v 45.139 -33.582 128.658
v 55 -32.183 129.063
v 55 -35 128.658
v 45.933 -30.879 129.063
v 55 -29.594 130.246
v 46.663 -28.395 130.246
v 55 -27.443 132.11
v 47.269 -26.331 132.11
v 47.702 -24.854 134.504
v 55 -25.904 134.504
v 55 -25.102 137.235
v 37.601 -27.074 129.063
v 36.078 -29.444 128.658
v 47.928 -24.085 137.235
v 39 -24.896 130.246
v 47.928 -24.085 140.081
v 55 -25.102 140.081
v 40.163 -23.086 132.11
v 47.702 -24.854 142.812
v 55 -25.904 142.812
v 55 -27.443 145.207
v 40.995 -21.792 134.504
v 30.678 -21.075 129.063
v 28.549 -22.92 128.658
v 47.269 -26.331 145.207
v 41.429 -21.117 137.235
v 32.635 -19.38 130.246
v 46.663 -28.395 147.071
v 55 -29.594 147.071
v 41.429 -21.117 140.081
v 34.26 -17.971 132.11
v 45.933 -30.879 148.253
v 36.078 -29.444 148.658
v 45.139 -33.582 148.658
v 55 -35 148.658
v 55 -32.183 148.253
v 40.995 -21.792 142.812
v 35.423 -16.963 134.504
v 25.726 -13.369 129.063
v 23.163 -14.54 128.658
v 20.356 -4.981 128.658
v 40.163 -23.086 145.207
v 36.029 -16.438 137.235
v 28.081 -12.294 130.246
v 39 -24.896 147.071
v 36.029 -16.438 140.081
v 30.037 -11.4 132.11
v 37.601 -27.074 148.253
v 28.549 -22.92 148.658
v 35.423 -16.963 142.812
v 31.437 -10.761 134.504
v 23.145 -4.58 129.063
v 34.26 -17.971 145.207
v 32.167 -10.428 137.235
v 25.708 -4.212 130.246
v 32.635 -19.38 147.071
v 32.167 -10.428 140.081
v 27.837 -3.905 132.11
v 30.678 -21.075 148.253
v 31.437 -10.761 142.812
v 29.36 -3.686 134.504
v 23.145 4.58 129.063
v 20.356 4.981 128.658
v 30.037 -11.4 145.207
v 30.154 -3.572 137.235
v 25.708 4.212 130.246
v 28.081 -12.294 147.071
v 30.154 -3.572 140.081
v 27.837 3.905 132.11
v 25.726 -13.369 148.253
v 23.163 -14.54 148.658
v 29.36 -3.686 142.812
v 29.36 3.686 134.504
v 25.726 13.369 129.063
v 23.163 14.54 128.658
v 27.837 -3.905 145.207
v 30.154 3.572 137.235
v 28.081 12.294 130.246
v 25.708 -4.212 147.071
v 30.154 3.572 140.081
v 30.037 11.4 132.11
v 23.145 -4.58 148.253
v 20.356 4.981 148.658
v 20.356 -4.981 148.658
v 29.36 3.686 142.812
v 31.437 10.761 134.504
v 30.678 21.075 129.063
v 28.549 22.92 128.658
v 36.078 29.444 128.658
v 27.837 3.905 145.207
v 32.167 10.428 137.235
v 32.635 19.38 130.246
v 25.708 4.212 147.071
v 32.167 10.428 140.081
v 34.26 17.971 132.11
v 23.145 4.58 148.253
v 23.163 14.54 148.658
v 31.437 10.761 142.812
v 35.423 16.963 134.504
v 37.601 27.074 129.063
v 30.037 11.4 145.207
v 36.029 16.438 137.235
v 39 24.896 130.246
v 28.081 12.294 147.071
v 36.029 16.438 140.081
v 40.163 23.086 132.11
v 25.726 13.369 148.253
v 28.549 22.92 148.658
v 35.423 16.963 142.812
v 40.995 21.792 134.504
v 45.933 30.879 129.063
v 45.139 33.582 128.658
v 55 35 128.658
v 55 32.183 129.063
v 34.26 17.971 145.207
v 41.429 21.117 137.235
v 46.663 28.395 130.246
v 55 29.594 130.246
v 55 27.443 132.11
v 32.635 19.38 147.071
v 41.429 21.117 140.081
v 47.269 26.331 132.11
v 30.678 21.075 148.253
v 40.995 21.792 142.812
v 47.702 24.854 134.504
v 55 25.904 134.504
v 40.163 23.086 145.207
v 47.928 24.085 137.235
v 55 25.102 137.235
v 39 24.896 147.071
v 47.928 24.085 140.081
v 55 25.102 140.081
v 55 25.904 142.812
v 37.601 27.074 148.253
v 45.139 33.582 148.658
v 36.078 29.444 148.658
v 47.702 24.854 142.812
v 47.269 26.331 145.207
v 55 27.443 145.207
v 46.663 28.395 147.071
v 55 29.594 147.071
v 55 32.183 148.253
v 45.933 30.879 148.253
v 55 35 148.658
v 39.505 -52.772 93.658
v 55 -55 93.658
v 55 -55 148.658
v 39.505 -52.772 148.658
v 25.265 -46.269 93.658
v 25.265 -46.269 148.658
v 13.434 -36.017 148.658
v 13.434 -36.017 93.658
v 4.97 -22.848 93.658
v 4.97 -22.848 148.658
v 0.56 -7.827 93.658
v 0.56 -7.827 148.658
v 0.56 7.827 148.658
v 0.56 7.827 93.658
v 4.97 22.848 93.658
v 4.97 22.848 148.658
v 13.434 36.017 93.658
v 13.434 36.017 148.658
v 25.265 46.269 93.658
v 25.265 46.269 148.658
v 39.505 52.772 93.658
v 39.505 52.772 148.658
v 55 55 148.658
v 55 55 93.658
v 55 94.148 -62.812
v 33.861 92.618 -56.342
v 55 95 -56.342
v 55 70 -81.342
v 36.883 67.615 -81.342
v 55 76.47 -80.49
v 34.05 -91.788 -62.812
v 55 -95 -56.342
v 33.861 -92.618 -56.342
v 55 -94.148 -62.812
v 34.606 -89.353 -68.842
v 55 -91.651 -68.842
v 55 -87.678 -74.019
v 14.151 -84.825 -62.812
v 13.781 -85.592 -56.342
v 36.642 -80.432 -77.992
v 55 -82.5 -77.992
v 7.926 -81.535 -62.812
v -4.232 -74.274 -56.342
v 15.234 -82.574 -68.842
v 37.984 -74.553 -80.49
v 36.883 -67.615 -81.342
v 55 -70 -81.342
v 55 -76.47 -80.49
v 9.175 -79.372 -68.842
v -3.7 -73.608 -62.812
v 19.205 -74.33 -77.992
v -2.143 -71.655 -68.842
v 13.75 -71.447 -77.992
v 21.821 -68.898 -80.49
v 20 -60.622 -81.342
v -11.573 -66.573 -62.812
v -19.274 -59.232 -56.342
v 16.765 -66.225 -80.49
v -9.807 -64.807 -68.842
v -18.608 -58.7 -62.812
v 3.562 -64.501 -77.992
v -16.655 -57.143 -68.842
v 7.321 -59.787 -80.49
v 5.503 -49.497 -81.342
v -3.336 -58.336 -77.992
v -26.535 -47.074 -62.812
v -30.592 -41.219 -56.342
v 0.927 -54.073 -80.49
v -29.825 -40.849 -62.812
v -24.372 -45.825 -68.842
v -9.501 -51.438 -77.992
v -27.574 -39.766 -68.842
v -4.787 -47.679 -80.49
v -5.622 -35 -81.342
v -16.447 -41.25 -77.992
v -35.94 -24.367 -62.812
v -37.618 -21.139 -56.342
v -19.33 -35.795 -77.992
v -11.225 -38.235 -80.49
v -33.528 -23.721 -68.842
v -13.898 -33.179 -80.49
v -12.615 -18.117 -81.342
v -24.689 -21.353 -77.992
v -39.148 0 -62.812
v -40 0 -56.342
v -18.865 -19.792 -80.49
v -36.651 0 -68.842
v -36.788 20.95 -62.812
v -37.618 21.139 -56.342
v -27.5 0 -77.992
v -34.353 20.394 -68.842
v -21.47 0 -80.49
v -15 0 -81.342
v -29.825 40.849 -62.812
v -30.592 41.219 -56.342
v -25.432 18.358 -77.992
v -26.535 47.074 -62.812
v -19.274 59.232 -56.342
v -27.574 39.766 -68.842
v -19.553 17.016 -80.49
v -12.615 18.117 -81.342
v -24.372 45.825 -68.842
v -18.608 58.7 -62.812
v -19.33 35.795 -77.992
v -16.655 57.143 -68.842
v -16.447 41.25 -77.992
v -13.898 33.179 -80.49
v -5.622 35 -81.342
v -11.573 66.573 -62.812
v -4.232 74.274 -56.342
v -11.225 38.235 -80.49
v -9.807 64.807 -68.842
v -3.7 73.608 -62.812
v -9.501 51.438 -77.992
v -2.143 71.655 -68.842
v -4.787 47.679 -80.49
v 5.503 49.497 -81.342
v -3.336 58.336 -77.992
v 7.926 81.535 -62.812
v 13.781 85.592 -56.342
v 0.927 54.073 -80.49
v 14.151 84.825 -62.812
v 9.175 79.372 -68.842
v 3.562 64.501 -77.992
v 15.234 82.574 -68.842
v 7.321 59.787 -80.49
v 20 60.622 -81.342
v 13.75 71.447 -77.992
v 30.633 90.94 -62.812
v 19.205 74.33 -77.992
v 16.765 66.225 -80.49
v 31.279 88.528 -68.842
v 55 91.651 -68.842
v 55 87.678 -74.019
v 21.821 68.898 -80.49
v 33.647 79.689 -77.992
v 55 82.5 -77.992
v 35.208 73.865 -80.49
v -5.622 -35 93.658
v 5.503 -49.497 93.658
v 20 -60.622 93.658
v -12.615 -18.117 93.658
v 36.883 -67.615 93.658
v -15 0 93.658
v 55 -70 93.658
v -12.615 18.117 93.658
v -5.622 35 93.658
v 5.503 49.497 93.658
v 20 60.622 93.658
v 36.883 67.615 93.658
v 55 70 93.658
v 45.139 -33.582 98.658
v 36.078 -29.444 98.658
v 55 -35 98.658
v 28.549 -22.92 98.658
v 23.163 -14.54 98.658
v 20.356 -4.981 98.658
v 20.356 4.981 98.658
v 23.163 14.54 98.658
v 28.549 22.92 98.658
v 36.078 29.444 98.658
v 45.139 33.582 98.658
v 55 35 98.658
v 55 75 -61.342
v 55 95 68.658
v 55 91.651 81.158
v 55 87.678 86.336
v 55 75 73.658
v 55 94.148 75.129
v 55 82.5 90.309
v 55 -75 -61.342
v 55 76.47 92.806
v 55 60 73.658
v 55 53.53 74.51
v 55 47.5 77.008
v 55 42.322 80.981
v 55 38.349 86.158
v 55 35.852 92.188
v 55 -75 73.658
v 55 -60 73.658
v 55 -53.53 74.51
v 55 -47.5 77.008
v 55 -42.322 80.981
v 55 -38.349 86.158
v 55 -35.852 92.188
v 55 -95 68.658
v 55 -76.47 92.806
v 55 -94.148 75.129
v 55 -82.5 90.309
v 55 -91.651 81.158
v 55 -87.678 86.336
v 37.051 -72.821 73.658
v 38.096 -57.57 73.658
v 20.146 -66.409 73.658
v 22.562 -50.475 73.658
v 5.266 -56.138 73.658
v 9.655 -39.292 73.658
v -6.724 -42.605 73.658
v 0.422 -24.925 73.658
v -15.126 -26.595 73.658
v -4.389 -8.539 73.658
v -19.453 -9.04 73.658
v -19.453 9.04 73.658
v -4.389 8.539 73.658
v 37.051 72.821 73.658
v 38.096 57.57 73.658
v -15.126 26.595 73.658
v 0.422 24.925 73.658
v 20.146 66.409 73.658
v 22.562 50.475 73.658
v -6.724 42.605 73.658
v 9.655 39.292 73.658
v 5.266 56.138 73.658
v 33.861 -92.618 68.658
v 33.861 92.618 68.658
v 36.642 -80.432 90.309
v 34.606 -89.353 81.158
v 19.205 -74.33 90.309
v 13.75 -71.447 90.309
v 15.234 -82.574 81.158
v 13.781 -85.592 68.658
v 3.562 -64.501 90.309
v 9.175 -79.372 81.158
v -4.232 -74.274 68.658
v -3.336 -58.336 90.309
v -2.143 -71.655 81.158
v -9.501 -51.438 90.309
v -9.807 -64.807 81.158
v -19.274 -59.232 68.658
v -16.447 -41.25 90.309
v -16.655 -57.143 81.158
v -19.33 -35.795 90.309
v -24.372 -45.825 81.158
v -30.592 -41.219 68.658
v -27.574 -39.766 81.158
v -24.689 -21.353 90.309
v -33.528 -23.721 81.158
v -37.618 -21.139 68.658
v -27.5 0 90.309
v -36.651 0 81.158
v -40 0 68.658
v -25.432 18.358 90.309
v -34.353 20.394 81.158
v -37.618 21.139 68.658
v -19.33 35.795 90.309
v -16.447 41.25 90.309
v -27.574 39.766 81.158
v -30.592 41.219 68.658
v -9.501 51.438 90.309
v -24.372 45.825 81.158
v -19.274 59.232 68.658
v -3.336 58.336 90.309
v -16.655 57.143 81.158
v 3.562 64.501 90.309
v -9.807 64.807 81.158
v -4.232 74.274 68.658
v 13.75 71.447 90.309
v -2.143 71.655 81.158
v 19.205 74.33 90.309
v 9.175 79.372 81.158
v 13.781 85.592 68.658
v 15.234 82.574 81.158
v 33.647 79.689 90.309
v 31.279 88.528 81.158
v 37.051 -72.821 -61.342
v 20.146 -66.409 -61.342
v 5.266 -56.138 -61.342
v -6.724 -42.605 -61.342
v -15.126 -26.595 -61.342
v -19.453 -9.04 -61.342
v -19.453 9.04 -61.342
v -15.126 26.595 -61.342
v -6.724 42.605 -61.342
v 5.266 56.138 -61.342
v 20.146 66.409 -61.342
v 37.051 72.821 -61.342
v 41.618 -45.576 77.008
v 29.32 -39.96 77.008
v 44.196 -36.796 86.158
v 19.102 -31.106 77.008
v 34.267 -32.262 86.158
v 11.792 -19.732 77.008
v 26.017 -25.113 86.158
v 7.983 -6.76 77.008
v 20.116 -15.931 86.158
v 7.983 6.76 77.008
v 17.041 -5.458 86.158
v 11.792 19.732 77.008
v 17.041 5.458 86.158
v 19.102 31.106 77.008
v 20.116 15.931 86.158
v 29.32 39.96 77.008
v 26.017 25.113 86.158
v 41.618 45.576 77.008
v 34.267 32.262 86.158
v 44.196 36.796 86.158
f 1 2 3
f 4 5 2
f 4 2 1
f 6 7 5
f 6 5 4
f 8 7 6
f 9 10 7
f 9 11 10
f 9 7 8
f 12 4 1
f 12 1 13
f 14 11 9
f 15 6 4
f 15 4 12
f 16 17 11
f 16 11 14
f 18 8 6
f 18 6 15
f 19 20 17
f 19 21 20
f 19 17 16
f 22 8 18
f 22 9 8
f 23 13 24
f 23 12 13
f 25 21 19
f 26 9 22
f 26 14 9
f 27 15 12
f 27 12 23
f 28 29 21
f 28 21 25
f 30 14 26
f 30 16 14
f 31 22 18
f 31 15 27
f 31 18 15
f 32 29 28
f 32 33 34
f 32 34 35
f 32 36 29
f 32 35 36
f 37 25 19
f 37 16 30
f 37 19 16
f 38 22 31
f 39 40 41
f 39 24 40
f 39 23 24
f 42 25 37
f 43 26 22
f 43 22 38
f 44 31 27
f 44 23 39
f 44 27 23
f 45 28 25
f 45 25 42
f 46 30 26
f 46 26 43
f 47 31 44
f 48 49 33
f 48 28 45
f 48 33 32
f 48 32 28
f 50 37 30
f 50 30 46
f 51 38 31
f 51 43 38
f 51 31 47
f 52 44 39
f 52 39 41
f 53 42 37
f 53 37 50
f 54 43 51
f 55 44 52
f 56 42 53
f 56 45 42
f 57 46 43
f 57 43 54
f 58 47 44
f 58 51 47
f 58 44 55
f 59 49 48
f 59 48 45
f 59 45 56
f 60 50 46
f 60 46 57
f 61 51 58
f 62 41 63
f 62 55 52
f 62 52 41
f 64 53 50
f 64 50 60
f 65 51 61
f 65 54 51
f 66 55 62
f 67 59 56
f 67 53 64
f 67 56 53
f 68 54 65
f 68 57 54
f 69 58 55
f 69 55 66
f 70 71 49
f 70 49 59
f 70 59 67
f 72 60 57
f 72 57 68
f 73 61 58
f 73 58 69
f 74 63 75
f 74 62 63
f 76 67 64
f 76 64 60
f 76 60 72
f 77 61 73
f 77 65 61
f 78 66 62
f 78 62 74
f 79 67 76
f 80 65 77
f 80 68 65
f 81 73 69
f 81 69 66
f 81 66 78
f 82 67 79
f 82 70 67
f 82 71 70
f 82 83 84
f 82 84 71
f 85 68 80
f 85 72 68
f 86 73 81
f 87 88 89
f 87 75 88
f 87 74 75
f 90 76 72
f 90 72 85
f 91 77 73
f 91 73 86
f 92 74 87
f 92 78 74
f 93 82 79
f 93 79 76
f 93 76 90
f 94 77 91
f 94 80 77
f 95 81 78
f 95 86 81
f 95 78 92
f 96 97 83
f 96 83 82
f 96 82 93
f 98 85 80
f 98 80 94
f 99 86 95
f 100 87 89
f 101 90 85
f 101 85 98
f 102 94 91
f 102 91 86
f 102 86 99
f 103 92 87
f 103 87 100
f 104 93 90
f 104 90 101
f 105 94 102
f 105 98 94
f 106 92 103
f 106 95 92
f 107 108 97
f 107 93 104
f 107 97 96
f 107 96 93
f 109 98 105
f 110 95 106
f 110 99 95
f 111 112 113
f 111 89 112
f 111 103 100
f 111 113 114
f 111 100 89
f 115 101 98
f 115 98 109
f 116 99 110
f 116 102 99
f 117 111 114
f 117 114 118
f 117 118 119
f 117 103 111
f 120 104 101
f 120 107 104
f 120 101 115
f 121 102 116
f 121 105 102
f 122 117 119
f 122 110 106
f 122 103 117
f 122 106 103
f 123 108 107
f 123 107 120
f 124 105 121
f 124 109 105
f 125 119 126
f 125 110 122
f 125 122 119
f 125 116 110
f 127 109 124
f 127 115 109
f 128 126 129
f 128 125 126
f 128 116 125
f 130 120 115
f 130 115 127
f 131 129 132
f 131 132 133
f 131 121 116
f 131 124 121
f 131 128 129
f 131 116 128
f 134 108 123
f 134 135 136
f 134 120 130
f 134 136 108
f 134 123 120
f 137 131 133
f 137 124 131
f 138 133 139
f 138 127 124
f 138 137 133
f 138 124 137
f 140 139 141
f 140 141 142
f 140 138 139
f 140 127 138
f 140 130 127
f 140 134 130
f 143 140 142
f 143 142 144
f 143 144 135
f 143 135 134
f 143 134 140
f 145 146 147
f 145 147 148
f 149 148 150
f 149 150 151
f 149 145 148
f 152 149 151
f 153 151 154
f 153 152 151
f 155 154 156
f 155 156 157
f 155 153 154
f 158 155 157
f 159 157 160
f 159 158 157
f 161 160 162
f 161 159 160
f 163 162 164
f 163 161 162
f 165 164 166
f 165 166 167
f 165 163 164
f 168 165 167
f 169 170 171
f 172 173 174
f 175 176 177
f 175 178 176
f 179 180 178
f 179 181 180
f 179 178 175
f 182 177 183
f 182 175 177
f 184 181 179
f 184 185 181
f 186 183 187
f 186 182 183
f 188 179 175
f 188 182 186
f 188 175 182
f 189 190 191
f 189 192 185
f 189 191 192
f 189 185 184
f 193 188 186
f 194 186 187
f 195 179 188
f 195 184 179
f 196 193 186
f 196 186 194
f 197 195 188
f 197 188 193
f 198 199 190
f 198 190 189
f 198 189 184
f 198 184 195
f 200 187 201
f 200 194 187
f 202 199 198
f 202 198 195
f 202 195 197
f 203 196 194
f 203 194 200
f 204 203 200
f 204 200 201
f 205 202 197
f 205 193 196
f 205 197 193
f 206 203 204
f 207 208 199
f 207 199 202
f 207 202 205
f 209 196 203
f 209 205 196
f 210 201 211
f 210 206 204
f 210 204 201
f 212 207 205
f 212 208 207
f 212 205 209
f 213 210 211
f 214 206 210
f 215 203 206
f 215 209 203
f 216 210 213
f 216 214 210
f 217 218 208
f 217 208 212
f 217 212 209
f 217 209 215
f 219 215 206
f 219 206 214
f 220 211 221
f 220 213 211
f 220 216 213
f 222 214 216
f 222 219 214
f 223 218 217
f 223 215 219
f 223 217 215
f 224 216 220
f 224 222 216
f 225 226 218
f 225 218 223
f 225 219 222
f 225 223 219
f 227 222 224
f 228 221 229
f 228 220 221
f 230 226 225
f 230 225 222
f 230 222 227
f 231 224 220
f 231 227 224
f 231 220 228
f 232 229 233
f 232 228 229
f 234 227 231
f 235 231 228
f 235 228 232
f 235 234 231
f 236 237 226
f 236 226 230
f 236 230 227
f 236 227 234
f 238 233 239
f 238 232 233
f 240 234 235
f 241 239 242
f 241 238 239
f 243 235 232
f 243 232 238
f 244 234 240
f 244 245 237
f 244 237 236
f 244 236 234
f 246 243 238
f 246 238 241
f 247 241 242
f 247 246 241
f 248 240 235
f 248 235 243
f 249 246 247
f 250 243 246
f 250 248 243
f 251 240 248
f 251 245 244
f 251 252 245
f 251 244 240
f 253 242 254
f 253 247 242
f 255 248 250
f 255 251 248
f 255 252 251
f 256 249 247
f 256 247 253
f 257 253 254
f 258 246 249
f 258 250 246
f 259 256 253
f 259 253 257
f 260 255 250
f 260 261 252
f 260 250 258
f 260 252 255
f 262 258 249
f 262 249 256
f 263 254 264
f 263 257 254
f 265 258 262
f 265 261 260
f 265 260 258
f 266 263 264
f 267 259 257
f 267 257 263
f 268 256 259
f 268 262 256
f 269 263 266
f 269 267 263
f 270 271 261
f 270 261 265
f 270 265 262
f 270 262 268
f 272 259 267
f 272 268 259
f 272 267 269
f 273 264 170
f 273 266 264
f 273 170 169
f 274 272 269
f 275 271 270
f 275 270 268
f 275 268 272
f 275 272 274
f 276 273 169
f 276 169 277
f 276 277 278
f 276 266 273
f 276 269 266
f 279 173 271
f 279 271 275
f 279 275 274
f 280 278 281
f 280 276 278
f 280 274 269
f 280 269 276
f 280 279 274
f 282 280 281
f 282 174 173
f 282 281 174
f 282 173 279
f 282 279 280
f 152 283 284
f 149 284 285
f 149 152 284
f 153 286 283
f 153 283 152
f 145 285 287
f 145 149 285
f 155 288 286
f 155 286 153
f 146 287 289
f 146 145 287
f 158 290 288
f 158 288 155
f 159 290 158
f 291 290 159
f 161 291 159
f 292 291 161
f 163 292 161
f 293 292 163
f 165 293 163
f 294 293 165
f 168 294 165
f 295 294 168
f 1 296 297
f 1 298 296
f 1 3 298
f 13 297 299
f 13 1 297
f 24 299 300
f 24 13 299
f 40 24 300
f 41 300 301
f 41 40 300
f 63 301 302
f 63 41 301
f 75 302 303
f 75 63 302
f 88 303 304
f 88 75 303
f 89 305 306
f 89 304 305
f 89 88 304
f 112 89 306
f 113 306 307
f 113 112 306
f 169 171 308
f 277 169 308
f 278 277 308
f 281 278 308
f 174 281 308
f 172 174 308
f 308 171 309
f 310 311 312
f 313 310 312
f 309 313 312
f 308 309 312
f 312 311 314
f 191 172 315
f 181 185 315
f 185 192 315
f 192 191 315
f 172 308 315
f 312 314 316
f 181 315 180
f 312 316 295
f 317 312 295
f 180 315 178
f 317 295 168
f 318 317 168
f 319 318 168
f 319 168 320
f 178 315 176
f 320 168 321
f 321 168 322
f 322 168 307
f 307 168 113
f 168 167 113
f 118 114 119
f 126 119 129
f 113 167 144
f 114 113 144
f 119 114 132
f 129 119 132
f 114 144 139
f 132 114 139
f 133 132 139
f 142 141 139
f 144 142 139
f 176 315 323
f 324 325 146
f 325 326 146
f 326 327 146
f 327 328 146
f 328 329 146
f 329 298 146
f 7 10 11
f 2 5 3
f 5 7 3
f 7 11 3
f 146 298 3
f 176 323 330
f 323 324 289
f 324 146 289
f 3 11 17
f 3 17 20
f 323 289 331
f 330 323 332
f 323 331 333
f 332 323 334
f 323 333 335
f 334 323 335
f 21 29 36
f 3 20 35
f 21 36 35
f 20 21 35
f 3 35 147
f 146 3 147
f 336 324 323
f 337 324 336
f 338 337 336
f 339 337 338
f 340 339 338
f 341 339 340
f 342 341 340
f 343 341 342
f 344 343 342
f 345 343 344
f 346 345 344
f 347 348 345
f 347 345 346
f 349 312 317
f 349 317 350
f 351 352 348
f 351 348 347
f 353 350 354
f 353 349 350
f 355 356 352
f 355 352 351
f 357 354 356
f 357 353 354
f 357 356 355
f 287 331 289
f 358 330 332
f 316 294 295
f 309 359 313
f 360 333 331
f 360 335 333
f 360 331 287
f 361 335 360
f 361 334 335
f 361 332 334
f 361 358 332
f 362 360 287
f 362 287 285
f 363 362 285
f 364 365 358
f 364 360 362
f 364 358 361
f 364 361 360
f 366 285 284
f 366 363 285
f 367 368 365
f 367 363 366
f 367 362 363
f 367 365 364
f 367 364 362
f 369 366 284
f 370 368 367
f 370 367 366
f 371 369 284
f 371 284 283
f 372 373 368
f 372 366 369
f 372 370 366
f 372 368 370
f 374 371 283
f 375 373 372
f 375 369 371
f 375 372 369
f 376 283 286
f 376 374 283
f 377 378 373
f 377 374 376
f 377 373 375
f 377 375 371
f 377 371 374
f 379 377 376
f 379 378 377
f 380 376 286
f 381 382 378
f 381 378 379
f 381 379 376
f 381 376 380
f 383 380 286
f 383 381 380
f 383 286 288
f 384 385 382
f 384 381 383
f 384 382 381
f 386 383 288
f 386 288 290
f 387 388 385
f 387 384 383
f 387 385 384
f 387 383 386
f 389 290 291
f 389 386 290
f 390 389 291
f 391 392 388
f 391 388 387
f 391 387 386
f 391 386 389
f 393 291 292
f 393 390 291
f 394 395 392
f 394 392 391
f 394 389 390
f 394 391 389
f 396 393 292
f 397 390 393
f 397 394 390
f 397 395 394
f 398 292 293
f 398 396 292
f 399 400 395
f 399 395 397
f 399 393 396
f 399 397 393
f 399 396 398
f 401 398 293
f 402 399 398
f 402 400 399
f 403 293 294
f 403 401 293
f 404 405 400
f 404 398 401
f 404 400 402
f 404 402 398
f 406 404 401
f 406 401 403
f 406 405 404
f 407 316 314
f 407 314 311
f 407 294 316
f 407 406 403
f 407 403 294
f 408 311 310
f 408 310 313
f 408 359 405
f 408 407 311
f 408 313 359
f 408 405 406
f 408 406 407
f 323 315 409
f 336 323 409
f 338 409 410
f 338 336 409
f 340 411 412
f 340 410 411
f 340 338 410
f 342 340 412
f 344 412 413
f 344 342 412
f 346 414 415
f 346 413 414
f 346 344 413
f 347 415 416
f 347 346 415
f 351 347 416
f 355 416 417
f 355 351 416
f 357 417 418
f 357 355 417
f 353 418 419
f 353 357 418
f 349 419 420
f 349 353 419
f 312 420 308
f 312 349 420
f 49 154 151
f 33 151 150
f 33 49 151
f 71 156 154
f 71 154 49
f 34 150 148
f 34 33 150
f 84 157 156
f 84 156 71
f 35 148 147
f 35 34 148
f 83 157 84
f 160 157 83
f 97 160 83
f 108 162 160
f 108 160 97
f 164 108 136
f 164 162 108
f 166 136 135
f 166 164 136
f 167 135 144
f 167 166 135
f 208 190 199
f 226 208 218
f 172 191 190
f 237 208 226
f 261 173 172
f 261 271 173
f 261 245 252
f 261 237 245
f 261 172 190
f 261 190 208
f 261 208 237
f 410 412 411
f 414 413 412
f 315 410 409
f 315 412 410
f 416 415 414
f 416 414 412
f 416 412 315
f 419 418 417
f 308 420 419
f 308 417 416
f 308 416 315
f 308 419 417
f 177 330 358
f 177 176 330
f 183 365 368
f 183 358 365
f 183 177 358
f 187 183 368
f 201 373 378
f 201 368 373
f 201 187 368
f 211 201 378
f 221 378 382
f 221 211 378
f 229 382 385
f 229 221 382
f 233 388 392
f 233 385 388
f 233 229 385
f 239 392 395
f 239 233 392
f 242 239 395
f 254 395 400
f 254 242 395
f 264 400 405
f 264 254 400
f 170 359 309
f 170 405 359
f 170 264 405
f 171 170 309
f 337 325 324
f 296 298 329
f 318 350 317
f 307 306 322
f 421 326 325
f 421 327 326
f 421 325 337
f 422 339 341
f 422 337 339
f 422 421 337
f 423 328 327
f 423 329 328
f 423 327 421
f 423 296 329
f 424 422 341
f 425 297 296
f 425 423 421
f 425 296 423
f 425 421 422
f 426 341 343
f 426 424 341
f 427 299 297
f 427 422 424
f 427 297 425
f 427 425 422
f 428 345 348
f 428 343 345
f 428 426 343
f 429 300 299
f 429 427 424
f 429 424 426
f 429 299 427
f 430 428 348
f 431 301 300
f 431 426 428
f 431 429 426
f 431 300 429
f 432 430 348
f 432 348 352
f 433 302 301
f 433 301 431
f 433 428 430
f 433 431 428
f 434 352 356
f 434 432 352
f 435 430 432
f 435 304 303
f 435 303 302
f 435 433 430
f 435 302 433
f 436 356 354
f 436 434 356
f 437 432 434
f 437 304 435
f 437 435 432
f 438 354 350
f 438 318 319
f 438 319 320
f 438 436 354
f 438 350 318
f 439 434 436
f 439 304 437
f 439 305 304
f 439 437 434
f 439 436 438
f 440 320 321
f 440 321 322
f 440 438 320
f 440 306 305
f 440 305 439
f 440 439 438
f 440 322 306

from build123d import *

# Parameters (mm, degrees)
F1_ANGLE = 180


with BuildPart() as f1:
    # F0 (on Front) → F1 (revolve, symmetric)
    with BuildSketch(Plane.XZ) as f1_sk:
        with BuildLine():
            ThreePointArc((-15, 93.658174), (-32.67767, 86.335844), (-40, 68.658174))
            Line((-40, 68.658174), (-40, -56.341826))
            ThreePointArc((-40, -56.341826), (-32.67767, -74.019496), (-15, -81.341826))
            Line((-15, -81.341826), (55, -81.341826))
            Line((55, -81.341826), (55, -61.341826))
            Line((55, -61.341826), (-20, -61.341826))
            Line((-20, -61.341826), (-20, 73.658174))
            Line((-20, 73.658174), (-5, 73.658174))
            ThreePointArc((-5, 73.658174), (12.67767, 80.980504), (20, 98.658174))
            Line((20, 98.658174), (20, 128.658174))
            ThreePointArc((20, 128.658174), (30, 138.658174), (20, 148.658174))
            Line((20, 148.658174), (0, 148.658174))
            Line((0, 148.658174), (0, 93.658174))
            Line((0, 93.658174), (-15, 93.658174))
        make_face()
    revolve(axis=Axis((55, 0, -71.341826), (0, 0, 1)), revolution_arc=F1_ANGLE / 2)
    revolve(f1_sk.sketch, axis=Axis((55, 0, -71.341826), (0, 0, -1)), revolution_arc=F1_ANGLE / 2)


solid = f1.part
